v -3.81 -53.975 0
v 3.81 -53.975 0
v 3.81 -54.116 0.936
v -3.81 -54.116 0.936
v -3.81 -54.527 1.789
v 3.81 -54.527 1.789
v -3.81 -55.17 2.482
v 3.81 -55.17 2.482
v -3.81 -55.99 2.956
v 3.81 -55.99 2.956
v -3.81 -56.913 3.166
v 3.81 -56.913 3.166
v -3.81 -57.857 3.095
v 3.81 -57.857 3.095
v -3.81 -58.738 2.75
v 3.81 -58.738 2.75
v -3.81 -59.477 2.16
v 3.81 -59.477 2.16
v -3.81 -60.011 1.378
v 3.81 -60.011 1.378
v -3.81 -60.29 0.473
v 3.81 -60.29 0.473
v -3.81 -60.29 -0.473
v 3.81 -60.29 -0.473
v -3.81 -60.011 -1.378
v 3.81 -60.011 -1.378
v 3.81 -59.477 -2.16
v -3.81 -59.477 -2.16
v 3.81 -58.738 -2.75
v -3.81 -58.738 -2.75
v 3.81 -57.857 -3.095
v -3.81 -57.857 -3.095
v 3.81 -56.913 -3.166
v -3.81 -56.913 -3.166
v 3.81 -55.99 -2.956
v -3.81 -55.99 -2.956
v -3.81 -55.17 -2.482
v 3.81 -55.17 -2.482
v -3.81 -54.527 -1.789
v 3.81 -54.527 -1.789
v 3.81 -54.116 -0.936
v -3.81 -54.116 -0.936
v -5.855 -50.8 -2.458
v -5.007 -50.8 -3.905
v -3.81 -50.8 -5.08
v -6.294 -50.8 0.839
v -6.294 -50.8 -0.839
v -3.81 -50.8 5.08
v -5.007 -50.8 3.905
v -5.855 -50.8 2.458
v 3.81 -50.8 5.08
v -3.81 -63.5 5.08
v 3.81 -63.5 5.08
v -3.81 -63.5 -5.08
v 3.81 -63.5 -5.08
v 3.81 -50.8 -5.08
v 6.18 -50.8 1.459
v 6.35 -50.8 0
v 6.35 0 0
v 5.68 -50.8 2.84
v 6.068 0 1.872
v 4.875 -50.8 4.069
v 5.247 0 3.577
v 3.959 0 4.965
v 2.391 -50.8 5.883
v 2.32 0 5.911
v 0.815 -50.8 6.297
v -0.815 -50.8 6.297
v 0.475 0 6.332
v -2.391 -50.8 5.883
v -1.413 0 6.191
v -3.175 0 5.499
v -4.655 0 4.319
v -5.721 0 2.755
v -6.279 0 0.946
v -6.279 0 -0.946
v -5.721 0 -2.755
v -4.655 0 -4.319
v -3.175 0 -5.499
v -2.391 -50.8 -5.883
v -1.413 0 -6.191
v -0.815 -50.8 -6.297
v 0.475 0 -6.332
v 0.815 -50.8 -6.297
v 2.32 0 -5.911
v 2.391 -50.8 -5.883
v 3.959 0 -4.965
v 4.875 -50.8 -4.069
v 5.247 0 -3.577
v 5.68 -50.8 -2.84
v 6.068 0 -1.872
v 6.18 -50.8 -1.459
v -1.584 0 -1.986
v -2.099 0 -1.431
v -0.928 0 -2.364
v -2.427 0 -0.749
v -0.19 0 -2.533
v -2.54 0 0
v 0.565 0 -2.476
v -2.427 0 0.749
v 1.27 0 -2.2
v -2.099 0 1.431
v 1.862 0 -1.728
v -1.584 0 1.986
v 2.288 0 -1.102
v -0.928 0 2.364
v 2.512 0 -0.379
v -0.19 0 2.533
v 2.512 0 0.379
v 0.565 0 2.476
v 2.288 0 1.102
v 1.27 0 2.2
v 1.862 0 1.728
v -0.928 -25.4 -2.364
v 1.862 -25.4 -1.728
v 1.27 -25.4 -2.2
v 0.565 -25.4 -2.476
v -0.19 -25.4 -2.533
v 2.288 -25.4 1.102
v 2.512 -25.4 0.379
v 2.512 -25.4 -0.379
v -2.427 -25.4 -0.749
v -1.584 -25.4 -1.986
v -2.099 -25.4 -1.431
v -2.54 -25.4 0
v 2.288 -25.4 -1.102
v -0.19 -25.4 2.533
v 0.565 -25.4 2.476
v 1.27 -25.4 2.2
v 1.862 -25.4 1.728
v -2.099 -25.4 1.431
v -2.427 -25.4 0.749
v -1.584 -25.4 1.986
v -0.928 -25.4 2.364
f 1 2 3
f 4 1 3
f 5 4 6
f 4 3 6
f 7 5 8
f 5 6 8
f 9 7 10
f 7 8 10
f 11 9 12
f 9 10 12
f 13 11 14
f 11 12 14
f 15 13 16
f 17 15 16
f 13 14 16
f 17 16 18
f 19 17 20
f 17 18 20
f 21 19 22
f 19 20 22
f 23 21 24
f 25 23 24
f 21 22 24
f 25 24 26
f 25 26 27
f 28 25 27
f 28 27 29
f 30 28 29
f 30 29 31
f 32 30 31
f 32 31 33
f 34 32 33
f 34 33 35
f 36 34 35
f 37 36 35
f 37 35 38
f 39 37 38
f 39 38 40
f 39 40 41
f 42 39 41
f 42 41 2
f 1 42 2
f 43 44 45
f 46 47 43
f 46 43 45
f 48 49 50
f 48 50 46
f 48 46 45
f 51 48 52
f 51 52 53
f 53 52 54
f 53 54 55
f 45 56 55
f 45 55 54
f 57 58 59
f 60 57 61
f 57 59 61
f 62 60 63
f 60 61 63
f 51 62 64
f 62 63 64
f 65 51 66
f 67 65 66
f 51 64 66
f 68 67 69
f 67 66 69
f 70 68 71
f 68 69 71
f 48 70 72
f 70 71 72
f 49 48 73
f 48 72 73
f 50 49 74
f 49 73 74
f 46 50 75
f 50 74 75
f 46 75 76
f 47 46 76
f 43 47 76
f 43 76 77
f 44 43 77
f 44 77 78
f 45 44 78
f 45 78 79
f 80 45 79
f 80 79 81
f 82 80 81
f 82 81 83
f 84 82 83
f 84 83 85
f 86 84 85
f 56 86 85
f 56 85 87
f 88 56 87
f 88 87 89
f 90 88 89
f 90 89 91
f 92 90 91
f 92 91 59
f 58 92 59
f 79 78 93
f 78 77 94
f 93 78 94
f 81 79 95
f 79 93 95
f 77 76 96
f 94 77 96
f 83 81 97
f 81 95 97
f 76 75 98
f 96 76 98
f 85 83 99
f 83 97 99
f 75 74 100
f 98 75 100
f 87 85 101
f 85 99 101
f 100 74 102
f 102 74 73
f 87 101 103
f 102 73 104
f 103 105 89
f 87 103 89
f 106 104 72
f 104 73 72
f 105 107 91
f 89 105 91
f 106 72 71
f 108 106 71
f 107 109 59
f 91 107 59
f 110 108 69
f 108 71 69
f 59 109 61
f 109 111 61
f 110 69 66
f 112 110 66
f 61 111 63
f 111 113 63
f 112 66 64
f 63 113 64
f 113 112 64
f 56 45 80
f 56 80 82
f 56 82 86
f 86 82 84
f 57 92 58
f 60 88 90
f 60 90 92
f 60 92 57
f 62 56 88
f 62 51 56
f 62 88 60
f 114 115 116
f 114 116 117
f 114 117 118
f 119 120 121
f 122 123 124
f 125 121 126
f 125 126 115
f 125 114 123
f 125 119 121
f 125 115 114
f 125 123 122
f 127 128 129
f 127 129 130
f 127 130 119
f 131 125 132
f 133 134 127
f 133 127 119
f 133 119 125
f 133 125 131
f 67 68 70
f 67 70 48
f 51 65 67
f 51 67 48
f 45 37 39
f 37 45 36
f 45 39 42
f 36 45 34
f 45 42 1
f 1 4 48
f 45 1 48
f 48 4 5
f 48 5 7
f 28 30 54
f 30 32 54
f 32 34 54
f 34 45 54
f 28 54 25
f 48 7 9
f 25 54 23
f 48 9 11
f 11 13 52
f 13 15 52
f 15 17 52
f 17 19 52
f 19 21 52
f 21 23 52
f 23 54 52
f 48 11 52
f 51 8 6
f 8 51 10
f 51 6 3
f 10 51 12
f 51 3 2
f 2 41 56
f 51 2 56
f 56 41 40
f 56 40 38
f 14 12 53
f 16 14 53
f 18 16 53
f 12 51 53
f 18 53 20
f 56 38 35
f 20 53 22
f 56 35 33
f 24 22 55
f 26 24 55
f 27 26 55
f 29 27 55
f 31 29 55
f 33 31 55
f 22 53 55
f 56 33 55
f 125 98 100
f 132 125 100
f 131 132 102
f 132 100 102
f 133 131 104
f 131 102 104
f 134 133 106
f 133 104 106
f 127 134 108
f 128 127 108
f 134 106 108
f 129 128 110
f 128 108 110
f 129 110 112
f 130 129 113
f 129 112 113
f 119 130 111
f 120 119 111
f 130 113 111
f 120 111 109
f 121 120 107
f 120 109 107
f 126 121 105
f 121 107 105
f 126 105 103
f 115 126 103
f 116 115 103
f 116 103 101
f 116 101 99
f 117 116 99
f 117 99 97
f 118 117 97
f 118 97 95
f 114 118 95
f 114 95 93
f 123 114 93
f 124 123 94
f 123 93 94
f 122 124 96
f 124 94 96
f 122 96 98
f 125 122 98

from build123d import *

# Parameters (mm, degrees)
F0_R     = 6.35
F1_DEPTH = 63.5
F3_DEPTH = 12.7
F4_R     = 3.175
F5_DEPTH = 25.4
F6_R     = 2.54
F7_DEPTH = 25.4


with BuildPart() as f1:
    # F0 (on Front) → F1 (new body)
    with BuildSketch(Plane.XZ):
        Circle(F0_R)
    extrude(amount=F1_DEPTH)

    # F2 (on face) → F3 (cut)
    with BuildSketch(Plane.XZ.offset(63.5)):
        with BuildLine():
            Line((0, 5.08), (3.81, 5.08))
            ThreePointArc((3.81, 5.08), (0, 6.35), (-3.81, 5.08))
            Line((-3.81, 5.08), (0, 5.08))
        make_face()
        with BuildLine():
            ThreePointArc((-3.81, -5.08), (0, -6.35), (3.81, -5.08))
            Line((3.81, -5.08), (-3.81, -5.08))
        make_face()
        with BuildLine():
            ThreePointArc((3.81, -5.08), (5.6796126628, -2.8398063314), (6.35, 0))
            ThreePointArc((6.35, 0), (5.6796126628, 2.8398063314), (3.81, 5.08))
            Line((3.81, 5.08), (3.81, -5.08))
        make_face()
        with BuildLine():
            Line((-3.81, -5.08), (-3.81, 5.08))
            ThreePointArc((-3.81, 5.08), (-6.35, 0), (-3.81, -5.08))
        make_face()
    extrude(amount=-F3_DEPTH, mode=Mode.SUBTRACT)

    # F4 (on face) → F5 (cut)
    with BuildSketch(Plane.YZ.offset(3.81)):
        with Locations((-57.15, 0)):
            Circle(F4_R)
    extrude(amount=-F5_DEPTH, mode=Mode.SUBTRACT)

    # F6 (on face) → F7 (cut)
    with BuildSketch(Plane(origin=(0, 0, 0), x_dir=(-1, 0, 0), z_dir=(0, 1, 0))):
        Circle(F6_R)
    extrude(amount=-F7_DEPTH, mode=Mode.SUBTRACT)


solid = f1.part
